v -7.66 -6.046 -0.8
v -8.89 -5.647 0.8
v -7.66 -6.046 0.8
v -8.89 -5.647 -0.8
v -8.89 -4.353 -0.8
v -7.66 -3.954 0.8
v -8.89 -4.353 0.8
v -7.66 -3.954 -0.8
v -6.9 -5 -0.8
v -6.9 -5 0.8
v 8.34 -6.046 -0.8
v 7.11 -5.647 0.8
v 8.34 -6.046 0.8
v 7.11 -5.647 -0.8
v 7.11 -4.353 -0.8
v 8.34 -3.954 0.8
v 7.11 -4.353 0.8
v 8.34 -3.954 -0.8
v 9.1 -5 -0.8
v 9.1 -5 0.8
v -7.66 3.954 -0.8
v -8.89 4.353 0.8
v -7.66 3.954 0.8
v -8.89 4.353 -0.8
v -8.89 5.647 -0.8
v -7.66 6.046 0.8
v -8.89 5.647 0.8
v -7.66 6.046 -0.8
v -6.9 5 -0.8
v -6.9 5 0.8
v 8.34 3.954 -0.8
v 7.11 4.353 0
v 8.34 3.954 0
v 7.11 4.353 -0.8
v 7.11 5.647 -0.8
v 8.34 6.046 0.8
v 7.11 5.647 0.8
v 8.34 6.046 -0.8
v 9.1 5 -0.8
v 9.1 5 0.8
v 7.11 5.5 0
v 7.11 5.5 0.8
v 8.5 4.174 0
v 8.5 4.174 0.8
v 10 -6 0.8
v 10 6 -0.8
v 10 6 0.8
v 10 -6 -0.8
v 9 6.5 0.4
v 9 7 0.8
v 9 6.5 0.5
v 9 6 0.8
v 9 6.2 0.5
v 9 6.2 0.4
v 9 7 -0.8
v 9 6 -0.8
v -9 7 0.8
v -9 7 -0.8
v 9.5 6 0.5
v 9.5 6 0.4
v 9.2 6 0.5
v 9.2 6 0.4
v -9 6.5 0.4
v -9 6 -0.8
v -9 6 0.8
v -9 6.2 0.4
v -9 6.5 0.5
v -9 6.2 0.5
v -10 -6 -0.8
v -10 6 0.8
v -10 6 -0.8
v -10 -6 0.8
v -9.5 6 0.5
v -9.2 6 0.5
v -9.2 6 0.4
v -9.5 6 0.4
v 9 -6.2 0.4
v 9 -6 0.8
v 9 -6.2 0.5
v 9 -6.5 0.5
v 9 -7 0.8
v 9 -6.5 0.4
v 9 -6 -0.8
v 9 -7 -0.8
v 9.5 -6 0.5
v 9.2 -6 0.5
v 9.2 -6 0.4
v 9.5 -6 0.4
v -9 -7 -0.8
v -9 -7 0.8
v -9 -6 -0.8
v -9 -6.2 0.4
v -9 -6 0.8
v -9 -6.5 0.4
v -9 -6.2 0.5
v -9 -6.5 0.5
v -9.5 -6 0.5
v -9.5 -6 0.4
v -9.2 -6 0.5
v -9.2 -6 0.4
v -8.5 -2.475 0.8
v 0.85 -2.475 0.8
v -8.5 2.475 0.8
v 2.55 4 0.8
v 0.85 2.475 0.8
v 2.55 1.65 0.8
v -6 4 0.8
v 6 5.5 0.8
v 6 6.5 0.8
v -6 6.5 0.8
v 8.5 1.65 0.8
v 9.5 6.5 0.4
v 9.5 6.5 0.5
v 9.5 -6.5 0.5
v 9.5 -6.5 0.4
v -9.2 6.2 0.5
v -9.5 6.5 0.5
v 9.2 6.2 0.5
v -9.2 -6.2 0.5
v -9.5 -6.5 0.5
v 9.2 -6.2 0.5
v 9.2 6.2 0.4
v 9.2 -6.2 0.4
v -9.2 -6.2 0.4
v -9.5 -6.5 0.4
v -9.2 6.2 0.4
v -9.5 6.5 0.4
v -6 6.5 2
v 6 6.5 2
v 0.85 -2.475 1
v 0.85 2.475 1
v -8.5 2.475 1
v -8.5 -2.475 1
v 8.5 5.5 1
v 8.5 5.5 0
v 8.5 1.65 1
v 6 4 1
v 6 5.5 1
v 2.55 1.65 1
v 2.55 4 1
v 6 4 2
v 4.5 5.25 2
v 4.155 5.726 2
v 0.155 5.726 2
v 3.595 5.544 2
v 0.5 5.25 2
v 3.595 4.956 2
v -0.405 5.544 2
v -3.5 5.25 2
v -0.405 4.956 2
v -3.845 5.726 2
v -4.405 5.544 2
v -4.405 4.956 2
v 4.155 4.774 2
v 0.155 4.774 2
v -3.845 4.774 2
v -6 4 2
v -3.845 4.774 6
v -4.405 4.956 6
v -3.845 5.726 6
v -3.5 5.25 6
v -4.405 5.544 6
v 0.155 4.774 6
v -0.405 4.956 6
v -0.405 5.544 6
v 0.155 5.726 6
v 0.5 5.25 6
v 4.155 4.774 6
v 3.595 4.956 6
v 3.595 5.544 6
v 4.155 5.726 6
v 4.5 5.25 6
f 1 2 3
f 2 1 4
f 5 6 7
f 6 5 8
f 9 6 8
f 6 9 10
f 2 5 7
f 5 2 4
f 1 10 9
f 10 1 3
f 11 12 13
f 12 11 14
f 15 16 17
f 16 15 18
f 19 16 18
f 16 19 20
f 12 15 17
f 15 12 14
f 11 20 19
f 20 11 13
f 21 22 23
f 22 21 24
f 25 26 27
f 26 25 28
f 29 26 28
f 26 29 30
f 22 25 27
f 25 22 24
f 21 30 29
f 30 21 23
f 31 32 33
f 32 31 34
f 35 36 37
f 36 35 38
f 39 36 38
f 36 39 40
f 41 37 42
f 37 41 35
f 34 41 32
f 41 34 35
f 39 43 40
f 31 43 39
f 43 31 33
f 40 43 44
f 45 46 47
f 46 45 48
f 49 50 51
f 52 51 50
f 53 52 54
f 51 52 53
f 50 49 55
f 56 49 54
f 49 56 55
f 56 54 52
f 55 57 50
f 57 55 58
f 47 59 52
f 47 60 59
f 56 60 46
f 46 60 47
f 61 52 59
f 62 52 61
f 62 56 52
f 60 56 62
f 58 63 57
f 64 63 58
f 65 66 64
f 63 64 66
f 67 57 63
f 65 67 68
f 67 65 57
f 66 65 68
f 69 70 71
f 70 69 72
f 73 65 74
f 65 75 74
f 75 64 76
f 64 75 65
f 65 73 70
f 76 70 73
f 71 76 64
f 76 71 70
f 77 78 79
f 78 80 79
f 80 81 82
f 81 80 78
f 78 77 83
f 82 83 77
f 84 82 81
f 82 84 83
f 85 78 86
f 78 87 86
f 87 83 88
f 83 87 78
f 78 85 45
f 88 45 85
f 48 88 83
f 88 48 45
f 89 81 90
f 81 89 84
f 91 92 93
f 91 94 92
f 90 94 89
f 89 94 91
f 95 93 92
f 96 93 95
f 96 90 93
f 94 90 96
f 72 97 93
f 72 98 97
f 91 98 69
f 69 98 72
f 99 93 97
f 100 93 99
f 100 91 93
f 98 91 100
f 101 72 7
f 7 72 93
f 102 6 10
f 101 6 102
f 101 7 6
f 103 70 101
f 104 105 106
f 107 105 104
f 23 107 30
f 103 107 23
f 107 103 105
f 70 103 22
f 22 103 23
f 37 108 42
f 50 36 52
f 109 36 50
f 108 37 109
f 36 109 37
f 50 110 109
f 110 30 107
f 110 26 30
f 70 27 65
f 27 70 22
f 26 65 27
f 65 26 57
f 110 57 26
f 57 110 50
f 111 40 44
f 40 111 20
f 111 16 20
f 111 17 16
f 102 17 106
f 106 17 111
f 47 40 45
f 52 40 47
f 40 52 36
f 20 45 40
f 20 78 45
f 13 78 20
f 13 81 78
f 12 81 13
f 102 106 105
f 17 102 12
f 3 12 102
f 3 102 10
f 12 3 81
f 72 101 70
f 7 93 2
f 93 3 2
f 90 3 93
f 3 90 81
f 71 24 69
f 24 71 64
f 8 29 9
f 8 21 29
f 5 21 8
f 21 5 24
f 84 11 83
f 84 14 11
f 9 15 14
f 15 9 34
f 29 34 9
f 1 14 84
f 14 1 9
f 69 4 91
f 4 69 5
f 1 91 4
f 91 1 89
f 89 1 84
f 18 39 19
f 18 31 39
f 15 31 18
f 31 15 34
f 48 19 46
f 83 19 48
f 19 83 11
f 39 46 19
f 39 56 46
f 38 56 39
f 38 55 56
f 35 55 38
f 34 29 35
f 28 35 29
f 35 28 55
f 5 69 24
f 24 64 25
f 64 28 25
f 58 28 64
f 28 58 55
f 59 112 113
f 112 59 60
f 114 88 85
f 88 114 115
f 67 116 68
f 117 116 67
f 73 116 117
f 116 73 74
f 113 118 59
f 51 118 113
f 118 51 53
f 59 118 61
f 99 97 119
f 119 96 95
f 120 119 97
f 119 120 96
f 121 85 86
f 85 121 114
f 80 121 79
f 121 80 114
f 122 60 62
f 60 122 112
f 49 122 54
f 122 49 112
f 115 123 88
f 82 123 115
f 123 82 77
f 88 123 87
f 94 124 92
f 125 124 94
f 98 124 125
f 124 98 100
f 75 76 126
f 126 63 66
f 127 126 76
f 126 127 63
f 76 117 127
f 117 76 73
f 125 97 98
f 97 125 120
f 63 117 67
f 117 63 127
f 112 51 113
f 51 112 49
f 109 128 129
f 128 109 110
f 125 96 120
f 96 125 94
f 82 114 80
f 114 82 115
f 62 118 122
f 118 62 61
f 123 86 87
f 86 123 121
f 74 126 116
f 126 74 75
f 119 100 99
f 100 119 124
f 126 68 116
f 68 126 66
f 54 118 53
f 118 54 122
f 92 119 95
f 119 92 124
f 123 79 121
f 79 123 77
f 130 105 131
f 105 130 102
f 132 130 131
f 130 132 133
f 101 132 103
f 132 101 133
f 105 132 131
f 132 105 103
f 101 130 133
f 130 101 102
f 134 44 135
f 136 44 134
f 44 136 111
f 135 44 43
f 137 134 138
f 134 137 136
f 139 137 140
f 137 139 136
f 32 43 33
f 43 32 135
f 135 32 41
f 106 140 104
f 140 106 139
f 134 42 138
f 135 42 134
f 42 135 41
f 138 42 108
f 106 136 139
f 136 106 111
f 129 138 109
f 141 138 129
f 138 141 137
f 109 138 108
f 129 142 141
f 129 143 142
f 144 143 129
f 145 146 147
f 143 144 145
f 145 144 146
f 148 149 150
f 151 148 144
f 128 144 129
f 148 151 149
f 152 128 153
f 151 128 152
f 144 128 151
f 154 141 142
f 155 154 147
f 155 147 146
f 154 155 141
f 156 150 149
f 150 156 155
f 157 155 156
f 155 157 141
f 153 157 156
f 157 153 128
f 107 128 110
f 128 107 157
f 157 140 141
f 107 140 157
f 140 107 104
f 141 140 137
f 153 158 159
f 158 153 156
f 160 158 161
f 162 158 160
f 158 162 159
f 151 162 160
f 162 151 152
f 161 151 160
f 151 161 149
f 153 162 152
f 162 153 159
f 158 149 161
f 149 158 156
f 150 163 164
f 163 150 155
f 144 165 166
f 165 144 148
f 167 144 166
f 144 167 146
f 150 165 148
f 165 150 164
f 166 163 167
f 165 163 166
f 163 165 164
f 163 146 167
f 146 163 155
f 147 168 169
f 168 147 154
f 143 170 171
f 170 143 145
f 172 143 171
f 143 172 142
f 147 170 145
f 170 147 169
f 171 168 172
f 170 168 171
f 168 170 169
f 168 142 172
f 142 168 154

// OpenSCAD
// Parameters
pcb_length = 20.0; //[10.0:40.0:0.1]
pcb_width = 14.0; //[7.0:28.0:0.1]
pcb_thickness = 1.6; //[0.8:3.2:0.1]
hole_diameter = 2.2; //[1.0:4.4:0.1]
hole_edge_offset = 2.0; //[1.0:4.0:0.1]
edge_chamfer_size = 1.0; //[0.5:2.0:0.1]
silkscreen_line_width = 0.3; //[0.15:0.6:0.05]
silkscreen_height = 0.1; //[0.05:0.3:0.05]
silkscreen_inset = 0.5; //[0.2:1.5:0.1]
placeholder_height = 1.0; //[0.5:3.0:0.1]
placeholder_margin = 1.5; //[0.5:3.0:0.1]
header_pin_diameter = 1.0; //[0.6:1.6:0.1]
header_pin_height = 6.0; //[3.0:12.0:0.5]
header_row_length = 12.0; //[6.0:18.0:0.5]
header_row_width = 2.5; //[1.5:4.0:0.1]
header_row_thickness = 2.0; //[1.0:4.0:0.1]
overlap = 0.8; //[0.5:2.0:0.1]

// Main PCB Body
module pcb_main_body() {
  color([0.0, 0.4, 0.2]) // Green for PCB
  cube([pcb_length, pcb_width, pcb_thickness], center=true);
}

// Mounting Holes
module mounting_hole(position) {
  translate(position)
    cylinder(h=pcb_thickness + 2*overlap, r=hole_diameter/2, center=true);
}

module mounting_holes() {
  union() {
    mounting_hole([(-pcb_length/2 + hole_edge_offset), (-pcb_width/2 + hole_edge_offset), 0]);
    mounting_hole([(pcb_length/2 - hole_edge_offset), (-pcb_width/2 + hole_edge_offset), 0]);
    mounting_hole([(-pcb_length/2 + hole_edge_offset), (pcb_width/2 - hole_edge_offset), 0]);
    mounting_hole([(pcb_length/2 - hole_edge_offset), (pcb_width/2 - hole_edge_offset), 0]);
  }
}

// Edge Chamfers
module edge_chamfer_cut(position) {
  translate(position)
    cube([edge_chamfer_size, edge_chamfer_size, pcb_thickness + 2*overlap], center=true);
}

module edge_chamfer() {
  union() {
    edge_chamfer_cut([(pcb_length/2 - edge_chamfer_size/2), (pcb_width/2 - edge_chamfer_size/2), 0]);
    edge_chamfer_cut([(-pcb_length/2 + edge_chamfer_size/2), (pcb_width/2 - edge_chamfer_size/2), 0]);
    edge_chamfer_cut([(pcb_length/2 - edge_chamfer_size/2), (-pcb_width/2 + edge_chamfer_size/2), 0]);
    edge_chamfer_cut([(-pcb_length/2 + edge_chamfer_size/2), (-pcb_width/2 + edge_chamfer_size/2), 0]);
  }
}

// PCB with Holes and Chamfers
module pcb_with_holes_and_chamfer() {
  difference() {
    pcb_main_body();
    mounting_holes();
    edge_chamfer();
  }
}

// Silkscreen Outline
module silkscreen_outline() {
  difference() {
    translate([0, 0, pcb_thickness/2 + silkscreen_height/2 - overlap/2])
      cube([pcb_length - 2*silkscreen_inset, pcb_width - 2*silkscreen_inset, silkscreen_height], center=true);
    translate([0, 0, pcb_thickness/2 + silkscreen_height/2 - overlap/2])
      cube([pcb_length - 2*(silkscreen_inset + silkscreen_line_width), pcb_width - 2*(silkscreen_inset + silkscreen_line_width), silkscreen_height + 2*overlap], center=true);
  }
}

// Component Placeholders
module component_placeholder_1() {
  translate([(-pcb_length/2 + placeholder_margin) + ((pcb_length - 2*placeholder_margin) * 0.55)/2, 0, pcb_thickness/2 + placeholder_height/2 - overlap])
    cube([(pcb_length - 2*placeholder_margin) * 0.55, (pcb_width - 2*placeholder_margin) * 0.45, placeholder_height], center=true);
}

module component_placeholder_2() {
  translate([(pcb_length/2 - placeholder_margin) - ((pcb_length - 2*placeholder_margin) * 0.35)/2, (pcb_width/2 - placeholder_margin) - ((pcb_width - 2*placeholder_margin) * 0.35)/2, pcb_thickness/2 + placeholder_height/2 - overlap])
    cube([(pcb_length - 2*placeholder_margin) * 0.35, (pcb_width - 2*placeholder_margin) * 0.35, placeholder_height], center=true);
}

module component_placeholders() {
  union() {
    component_placeholder_1();
    component_placeholder_2();
  }
}

// Pin Headers
module pin_header_body() {
  translate([0, (pcb_width/2 - header_row_width/2 - silkscreen_inset), pcb_thickness/2 + header_row_thickness/2 - overlap])
    cube([header_row_length, header_row_width, header_row_thickness], center=true);
}

module pin_header_pin(position) {
  translate(position)
    cylinder(h=header_pin_height, r=header_pin_diameter/2, center=true);
}

module pin_headers() {
  union() {
    pin_header_body();
    pin_header_pin([(-header_row_length/2) + (header_row_length/6), (pcb_width/2 - header_row_width/2 - silkscreen_inset), pcb_thickness/2 + header_pin_height/2 - overlap]);
    pin_header_pin([(-header_row_length/2) + (header_row_length/2), (pcb_width/2 - header_row_width/2 - silkscreen_inset), pcb_thickness/2 + header_pin_height/2 - overlap]);
    pin_header_pin([(-header_row_length/2) + (header_row_length*5/6), (pcb_width/2 - header_row_width/2 - silkscreen_inset), pcb_thickness/2 + header_pin_height/2 - overlap]);
  }
}

// Complete Model
module complete_model() {
  union() {
    pcb_with_holes_and_chamfer();
    silkscreen_outline();
    component_placeholders();
    pin_headers();
  }
}

// Render the complete model
complete_model();
